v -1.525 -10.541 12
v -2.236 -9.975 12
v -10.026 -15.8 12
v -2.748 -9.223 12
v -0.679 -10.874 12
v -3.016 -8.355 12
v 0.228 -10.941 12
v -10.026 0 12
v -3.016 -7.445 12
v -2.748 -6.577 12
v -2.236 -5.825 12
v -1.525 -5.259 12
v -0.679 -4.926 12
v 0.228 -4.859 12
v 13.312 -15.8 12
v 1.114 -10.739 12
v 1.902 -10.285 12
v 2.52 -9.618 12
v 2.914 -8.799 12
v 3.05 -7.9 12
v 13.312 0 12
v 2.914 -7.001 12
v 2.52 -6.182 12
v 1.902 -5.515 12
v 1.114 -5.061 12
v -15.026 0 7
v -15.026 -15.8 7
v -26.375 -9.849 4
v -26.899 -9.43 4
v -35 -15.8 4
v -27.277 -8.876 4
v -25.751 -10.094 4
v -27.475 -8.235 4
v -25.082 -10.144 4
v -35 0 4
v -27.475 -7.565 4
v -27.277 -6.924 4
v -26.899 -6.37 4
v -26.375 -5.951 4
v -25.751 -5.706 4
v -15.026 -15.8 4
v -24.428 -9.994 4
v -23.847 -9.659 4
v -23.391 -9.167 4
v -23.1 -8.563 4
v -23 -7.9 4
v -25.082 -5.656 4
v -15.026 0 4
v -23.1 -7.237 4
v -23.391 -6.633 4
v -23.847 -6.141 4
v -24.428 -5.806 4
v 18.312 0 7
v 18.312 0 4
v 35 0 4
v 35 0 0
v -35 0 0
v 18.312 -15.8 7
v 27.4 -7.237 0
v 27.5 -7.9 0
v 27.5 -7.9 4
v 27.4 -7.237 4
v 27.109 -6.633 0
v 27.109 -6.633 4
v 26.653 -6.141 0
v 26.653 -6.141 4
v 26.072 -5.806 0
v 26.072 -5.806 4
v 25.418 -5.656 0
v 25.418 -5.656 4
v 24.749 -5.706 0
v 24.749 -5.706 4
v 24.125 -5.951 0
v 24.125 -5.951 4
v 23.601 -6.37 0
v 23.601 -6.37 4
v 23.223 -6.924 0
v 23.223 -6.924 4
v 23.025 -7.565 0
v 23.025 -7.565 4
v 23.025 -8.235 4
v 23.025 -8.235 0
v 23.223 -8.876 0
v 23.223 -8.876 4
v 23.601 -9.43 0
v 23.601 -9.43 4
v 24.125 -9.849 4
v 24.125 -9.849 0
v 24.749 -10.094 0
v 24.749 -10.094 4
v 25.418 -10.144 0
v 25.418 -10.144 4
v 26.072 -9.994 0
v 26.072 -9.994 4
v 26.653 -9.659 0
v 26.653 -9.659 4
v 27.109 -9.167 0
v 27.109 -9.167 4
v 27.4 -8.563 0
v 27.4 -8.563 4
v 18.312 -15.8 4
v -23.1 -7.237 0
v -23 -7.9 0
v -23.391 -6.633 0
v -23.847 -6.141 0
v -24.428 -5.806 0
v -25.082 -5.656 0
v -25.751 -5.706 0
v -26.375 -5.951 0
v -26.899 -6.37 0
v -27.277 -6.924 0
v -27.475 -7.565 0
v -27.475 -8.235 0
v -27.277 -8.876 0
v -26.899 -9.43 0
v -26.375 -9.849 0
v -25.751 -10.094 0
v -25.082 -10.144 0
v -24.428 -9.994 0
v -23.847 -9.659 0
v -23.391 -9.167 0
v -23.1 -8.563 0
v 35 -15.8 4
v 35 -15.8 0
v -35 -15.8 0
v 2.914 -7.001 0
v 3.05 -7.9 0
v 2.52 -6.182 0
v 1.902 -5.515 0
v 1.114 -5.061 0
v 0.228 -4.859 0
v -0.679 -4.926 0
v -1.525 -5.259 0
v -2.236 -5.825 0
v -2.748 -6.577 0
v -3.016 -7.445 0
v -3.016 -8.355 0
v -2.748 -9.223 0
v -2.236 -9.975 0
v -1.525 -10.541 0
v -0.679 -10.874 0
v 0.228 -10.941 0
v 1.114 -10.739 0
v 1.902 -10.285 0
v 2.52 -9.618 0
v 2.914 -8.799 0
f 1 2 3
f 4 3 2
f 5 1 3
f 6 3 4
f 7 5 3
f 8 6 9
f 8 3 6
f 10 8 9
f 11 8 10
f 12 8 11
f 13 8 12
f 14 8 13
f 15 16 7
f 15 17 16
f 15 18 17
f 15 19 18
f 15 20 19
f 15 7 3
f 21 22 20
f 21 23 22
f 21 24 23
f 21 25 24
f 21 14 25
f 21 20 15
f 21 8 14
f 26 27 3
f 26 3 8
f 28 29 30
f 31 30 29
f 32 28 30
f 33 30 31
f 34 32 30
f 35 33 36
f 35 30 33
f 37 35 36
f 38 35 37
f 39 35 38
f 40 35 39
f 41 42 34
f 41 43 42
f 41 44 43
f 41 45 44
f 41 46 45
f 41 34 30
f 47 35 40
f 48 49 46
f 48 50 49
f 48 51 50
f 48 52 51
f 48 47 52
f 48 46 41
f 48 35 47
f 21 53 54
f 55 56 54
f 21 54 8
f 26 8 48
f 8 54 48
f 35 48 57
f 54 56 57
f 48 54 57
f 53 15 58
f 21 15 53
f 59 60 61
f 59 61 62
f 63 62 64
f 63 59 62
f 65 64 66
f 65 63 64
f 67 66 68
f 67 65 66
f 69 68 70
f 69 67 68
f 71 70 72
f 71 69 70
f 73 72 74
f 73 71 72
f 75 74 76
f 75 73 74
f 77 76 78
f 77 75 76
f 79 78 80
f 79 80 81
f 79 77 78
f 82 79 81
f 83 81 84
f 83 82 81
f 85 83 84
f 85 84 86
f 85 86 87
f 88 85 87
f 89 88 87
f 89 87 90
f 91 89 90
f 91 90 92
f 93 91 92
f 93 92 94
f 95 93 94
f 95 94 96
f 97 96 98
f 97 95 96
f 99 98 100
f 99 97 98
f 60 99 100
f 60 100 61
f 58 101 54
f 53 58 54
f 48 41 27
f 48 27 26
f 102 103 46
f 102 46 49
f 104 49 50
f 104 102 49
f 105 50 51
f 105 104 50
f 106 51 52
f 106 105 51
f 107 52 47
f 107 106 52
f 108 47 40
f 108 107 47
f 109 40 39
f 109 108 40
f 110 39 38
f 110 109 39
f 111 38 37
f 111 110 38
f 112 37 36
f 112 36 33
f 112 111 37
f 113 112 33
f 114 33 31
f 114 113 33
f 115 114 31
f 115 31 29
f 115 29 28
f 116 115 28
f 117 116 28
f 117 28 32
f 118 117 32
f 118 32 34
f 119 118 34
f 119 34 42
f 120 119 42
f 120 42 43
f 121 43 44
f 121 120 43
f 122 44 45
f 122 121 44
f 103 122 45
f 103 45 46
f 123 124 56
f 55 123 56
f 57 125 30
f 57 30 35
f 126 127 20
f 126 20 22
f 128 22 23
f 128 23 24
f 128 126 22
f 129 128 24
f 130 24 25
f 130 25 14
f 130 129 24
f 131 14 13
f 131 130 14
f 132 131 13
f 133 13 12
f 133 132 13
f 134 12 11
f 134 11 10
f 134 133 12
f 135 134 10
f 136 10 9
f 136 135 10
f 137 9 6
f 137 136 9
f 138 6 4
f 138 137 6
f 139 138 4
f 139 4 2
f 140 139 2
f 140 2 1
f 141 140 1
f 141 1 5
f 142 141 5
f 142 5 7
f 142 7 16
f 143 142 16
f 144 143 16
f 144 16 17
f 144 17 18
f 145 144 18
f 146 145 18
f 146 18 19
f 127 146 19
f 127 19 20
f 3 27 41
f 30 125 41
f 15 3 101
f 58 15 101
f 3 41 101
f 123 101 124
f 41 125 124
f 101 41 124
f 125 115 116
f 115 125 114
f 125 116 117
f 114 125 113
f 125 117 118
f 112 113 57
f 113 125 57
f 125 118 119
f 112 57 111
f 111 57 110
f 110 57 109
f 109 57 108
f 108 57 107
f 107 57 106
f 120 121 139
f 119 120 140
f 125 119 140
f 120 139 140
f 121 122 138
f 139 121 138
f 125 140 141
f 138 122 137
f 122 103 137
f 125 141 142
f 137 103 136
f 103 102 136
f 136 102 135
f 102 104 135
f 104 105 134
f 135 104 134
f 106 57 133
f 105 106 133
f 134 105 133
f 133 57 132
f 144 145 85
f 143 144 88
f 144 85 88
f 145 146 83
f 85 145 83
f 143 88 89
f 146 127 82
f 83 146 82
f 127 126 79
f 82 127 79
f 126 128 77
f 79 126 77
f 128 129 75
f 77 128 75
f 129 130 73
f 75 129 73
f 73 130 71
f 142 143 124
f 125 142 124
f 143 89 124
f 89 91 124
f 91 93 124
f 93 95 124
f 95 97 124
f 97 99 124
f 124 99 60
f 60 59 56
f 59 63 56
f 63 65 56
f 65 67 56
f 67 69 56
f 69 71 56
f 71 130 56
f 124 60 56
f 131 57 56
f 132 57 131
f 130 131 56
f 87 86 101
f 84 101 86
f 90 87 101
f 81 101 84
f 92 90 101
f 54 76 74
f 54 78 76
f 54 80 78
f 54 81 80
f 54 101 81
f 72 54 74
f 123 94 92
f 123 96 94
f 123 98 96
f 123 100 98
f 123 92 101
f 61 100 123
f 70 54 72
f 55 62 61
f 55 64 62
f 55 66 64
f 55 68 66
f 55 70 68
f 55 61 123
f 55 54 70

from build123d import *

# Parameters (mm, degrees)
F0_W     = 19.9736606702
F0_H     = 15.8
F0_R     = 2.25
F0_W_2   = 16.687778607
F0_W_3   = 33.3385607228
F0_R_2   = 3.05
F1_DEPTH = 4
F2_DEPTH = 12
F3_SIZE  = 5


with BuildPart() as f1:
    # F0 (on Top) → F1 (new body)
    with BuildSketch(Plane.XY):
        with Locations((-25.0131696649, -7.9)):
            Rectangle(F0_W, F0_H)
        with Locations((-25.25, -7.9)):
            Circle(F0_R, mode=Mode.SUBTRACT)
        with Locations((26.6561106965, -7.9)):
            Rectangle(F0_W_2, F0_H)
        with Locations((25.25, -7.9)):
            Circle(F0_R, mode=Mode.SUBTRACT)
        with Locations((1.6429410316, -7.9)):
            Rectangle(F0_W_3, F0_H)
        with Locations((0, -7.9)):
            Circle(F0_R_2, mode=Mode.SUBTRACT)
    extrude(amount=F1_DEPTH)

    # F0 (on Top) → F2 (join)
    with BuildSketch(Plane.XY):
        with Locations((1.6429410316, -7.9)):
            Rectangle(F0_W_3, F0_H)
        with Locations((0, -7.9)):
            Circle(F0_R_2, mode=Mode.SUBTRACT)
    extrude(amount=F2_DEPTH)

    # F3
    f3_edges = [f1.edges().sort_by_distance(p)[0] for p in [
        (-15.026339, -7.9, 12),
        (18.312221, -7.9, 12),
    ]]
    chamfer(f3_edges, length=F3_SIZE)


solid = f1.part
